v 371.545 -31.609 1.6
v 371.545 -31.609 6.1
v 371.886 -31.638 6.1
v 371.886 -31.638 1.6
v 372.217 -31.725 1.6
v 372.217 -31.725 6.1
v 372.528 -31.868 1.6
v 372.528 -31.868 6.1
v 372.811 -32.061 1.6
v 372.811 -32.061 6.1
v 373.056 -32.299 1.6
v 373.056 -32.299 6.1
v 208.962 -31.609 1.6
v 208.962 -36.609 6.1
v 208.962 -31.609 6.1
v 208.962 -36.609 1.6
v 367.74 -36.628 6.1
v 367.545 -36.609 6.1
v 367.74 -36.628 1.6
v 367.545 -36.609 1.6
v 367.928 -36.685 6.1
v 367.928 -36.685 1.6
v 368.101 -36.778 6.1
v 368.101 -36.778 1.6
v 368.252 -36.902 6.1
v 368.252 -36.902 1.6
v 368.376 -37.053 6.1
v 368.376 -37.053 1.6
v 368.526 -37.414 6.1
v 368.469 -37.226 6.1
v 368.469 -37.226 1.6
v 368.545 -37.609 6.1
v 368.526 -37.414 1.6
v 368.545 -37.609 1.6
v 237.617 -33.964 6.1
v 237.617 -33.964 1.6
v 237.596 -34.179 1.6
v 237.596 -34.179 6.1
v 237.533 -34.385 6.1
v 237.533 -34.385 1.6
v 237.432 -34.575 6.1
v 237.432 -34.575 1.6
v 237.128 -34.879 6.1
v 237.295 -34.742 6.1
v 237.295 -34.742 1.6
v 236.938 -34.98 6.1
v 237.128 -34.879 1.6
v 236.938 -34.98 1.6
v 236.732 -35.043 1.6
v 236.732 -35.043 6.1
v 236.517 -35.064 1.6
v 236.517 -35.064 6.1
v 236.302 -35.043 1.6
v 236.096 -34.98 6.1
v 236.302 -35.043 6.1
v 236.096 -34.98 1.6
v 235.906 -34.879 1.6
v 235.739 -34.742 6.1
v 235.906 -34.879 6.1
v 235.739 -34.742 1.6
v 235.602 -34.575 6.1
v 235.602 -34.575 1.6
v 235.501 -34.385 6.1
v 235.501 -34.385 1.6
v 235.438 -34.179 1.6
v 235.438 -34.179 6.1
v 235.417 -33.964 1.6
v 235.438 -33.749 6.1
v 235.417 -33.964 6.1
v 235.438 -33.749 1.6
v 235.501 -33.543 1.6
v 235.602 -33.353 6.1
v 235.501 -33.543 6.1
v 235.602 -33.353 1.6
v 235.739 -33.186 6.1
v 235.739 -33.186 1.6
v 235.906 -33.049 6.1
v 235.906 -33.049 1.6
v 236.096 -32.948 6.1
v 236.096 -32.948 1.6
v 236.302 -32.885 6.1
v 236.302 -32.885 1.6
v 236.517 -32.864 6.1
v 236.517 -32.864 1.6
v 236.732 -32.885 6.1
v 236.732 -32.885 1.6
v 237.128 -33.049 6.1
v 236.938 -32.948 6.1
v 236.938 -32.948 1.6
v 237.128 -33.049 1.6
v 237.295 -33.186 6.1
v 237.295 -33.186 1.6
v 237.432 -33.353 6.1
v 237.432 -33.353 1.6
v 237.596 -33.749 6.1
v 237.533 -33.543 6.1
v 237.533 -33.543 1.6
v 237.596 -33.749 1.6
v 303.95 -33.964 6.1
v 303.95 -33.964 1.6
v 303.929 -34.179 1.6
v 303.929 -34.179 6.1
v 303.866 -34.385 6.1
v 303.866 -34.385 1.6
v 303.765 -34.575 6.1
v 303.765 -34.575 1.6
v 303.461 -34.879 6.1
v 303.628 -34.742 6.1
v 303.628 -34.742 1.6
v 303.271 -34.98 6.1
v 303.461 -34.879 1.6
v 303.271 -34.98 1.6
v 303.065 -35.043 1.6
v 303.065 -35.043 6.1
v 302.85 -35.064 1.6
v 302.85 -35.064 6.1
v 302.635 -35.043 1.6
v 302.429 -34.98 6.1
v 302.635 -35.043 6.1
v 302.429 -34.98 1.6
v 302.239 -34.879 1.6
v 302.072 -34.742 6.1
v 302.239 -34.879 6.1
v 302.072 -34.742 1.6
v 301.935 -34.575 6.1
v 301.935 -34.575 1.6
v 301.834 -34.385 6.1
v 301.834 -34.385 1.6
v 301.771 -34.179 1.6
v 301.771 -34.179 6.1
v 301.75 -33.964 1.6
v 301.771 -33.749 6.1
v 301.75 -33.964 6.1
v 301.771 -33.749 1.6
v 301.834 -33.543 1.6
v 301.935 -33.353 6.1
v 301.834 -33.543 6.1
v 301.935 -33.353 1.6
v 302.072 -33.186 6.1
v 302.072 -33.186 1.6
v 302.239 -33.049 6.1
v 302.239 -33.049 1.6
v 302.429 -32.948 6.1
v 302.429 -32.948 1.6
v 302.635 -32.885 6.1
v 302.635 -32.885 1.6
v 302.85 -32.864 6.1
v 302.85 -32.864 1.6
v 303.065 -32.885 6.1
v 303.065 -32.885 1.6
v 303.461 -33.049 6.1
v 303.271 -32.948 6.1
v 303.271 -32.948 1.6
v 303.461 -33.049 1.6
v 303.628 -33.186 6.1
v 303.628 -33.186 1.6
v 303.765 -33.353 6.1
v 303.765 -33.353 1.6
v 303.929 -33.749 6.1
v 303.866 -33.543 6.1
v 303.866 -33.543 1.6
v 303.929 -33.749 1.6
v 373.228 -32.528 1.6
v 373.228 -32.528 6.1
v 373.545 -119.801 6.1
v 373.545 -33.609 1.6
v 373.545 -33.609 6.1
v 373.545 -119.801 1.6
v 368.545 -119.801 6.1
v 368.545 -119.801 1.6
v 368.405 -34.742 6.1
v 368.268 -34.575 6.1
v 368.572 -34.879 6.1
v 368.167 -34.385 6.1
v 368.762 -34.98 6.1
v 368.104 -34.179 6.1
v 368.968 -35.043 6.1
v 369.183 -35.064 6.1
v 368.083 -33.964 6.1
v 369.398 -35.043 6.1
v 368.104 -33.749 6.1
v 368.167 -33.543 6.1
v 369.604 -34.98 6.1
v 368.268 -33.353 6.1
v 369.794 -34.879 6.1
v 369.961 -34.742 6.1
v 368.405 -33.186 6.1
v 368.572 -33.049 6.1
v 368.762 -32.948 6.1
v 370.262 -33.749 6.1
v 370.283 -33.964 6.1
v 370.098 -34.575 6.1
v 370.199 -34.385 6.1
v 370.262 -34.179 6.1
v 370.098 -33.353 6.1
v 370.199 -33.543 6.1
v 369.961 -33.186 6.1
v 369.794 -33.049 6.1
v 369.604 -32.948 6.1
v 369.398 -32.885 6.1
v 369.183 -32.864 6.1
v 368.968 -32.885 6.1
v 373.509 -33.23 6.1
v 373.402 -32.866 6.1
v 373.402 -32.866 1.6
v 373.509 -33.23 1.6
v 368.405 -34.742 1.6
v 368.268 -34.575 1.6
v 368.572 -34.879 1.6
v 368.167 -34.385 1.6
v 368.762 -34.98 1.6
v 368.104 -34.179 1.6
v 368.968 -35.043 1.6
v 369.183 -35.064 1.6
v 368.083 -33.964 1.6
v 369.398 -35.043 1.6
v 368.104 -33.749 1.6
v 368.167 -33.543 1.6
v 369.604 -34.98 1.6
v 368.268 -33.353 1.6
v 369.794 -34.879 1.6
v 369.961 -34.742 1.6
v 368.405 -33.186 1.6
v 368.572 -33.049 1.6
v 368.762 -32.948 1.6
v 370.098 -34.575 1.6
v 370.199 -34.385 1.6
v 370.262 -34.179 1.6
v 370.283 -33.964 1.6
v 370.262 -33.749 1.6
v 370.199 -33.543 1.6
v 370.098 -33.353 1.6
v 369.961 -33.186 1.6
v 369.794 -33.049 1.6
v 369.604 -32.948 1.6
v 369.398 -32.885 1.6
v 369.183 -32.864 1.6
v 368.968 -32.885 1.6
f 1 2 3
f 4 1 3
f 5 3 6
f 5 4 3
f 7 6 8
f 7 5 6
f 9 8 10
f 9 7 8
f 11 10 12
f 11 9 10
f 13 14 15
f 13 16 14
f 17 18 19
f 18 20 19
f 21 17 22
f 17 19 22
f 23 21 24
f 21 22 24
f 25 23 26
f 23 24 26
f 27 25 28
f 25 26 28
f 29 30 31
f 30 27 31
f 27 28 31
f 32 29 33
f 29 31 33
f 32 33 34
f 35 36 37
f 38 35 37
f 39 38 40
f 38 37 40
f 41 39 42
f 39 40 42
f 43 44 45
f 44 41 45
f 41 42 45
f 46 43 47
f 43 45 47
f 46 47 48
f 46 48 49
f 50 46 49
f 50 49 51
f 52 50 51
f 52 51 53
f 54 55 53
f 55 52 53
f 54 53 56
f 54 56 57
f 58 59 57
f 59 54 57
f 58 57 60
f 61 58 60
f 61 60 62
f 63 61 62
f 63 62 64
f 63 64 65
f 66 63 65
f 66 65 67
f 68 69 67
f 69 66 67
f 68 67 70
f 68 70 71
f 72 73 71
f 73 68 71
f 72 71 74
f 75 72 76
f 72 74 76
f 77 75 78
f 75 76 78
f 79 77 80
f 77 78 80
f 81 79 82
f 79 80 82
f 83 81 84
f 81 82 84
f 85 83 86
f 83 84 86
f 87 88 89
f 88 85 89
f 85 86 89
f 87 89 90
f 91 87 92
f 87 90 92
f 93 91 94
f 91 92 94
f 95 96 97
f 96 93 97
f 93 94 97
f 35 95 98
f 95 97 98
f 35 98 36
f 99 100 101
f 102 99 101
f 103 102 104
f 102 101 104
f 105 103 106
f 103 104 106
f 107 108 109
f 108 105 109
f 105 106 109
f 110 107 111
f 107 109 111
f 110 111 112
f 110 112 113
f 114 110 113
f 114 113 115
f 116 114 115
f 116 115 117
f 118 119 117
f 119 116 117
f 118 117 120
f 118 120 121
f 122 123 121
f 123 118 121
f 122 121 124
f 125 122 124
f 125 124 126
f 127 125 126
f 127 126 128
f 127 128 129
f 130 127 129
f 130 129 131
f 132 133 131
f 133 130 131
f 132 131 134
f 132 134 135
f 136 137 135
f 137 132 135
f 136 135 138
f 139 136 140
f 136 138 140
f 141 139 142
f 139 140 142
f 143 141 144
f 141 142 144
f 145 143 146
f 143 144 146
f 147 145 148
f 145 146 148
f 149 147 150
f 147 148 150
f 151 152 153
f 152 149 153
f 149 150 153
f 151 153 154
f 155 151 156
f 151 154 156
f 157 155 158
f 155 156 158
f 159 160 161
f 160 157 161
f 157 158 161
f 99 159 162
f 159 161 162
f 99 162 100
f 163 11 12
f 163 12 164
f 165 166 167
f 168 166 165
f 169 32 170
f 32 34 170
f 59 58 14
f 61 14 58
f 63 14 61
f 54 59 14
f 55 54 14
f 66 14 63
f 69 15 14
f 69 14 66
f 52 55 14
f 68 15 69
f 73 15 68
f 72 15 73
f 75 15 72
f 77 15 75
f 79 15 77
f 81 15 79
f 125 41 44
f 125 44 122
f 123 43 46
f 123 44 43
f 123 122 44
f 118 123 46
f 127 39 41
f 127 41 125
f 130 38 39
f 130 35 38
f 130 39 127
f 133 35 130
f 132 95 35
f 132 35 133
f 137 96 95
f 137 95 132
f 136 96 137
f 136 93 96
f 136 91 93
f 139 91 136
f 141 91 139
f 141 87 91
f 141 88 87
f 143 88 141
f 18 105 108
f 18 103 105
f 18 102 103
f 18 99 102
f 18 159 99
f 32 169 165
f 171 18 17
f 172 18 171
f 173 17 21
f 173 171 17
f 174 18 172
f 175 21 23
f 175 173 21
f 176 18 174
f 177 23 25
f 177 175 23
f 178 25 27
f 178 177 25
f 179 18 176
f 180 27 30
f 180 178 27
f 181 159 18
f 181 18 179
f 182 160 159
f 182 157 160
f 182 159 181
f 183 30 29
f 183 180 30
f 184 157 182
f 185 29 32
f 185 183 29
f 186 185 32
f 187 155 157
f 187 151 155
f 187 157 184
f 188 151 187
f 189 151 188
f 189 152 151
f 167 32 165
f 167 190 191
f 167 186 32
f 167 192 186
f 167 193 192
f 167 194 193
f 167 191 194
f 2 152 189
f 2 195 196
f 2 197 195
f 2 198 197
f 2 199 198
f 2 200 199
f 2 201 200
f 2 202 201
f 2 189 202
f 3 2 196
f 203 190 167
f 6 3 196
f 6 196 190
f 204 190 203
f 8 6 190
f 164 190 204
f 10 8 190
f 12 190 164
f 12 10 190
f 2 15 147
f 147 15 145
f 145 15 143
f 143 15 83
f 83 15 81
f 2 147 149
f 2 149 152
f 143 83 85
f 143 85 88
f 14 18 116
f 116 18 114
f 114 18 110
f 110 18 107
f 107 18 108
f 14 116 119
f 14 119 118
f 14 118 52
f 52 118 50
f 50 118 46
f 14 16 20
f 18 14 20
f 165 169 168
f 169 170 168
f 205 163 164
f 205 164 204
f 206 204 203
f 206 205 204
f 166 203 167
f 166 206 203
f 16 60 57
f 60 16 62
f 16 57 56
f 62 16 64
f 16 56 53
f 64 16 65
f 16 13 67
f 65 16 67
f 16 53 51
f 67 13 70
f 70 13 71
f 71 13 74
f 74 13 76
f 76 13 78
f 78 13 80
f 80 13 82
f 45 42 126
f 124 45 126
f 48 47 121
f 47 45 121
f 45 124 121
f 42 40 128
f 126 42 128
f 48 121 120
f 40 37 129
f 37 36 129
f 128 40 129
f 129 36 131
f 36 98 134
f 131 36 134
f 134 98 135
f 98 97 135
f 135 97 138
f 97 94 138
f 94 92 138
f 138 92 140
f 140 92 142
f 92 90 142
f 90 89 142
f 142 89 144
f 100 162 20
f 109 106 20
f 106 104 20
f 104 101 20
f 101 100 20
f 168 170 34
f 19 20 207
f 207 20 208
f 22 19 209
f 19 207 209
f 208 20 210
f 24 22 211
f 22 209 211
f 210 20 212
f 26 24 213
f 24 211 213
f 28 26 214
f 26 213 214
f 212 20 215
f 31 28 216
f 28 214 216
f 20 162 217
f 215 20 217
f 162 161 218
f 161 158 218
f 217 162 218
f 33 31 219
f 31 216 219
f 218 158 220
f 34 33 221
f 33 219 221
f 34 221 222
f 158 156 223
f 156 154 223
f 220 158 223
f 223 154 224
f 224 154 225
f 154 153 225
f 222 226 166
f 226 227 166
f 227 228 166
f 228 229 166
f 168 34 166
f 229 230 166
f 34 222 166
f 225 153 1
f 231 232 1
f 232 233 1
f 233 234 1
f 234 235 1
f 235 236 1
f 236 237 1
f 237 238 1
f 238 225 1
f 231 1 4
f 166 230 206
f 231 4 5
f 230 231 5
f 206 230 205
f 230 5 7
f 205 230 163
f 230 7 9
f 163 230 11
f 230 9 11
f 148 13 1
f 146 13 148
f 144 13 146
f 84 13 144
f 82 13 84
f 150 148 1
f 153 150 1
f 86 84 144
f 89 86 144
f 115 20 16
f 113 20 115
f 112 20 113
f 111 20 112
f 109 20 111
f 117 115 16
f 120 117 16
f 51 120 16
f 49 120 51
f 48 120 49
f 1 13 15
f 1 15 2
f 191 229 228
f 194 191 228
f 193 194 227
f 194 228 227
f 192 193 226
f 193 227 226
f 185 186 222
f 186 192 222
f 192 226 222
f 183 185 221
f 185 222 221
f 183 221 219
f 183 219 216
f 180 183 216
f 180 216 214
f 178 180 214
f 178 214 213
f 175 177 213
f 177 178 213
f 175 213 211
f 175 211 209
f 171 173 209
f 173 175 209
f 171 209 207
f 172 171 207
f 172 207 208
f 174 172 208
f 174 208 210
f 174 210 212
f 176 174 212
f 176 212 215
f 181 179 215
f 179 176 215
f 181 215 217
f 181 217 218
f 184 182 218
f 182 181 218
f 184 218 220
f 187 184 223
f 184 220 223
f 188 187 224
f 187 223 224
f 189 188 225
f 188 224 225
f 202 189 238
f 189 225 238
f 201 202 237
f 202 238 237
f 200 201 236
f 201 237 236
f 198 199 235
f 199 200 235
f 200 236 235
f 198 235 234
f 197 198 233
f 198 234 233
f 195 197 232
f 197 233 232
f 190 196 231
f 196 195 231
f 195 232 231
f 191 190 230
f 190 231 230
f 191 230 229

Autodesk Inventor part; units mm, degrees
ref_plane "YZ Plane" through (0, 0, 0) normal (1, 0, 0) x (0, 1, 0)
ref_plane "XZ Plane" through (0, 0, 0) normal (0, 1, 0) x (-1, 0, 0)
ref_plane "XY Plane" through (0, 0, 0) normal (0, 0, 1) x (1, 0, 0)
ref_plane "Work Plane2" through (35.545, -31.609, 1.6) normal (0, 0, 1) x (1, 0, 0)
ref_plane "Work Plane1" through (35.545, -31.609, 1.6) normal (0, 0, 1) x (1, 0, 0)
sketch "Sketch1" plane through (35.545, -31.609, 1.6) normal (0, 0, 1) x (1, 0, 0)
  line L0 (0, 0) -> (336, 0) projected
  line L1 (-2, -129) -> (-2, -2) projected
  line L2 (-1.6825, -0.9187) -> (-1.5115, -0.6903) projected
  arc A0 (0, 0) -> (-2, -2) centre (0, -2) ccw
  line L3 (338, -2) -> (338, -129) projected
  line L4 (337.5115, -0.6903) -> (337.6825, -0.9187) projected
  arc A1 (338, -2) -> (336, 0) centre (336, -2) ccw
  line L5 (336, -131) -> (0, -131) projected
  line L6 (337.6825, -130.0813) -> (337.5115, -130.3097) projected
  arc A2 (336, -131) -> (338, -129) centre (336, -129) ccw
  arc A3 (-2, -129) -> (0, -131) centre (0, -129) ccw
  circle A4 centre (1.98, -128.63) radius 1.1 projected
  circle A5 centre (1.98, -128.63) radius 1.1
  circle A6 centre (68.313, -128.63) radius 1.1 projected
  circle A7 centre (134.646, -128.63) radius 1.1 projected
  circle A8 centre (134.646, -128.63) radius 1.1
  circle A9 centre (68.313, -128.63) radius 1.1
  circle A10 centre (200.979, -128.63) radius 1.1 projected
  circle A11 centre (267.312, -128.63) radius 1.1 projected
  circle A12 centre (333.645, -128.63) radius 1.1 projected
  circle A13 centre (333.645, -128.63) radius 1.1
  circle A14 centre (267.312, -128.63) radius 1.1
  circle A15 centre (200.979, -128.63) radius 1.1
  circle A16 centre (333.638, -2.355) radius 1.1 projected
  circle A17 centre (1.973, -2.355) radius 1.1 projected
  circle A18 centre (68.306, -2.355) radius 1.1 projected
  circle A19 centre (134.639, -2.355) radius 1.1 projected
  circle A20 centre (200.972, -2.355) radius 1.1 projected
  circle A21 centre (267.305, -2.355) radius 1.1 projected
  circle A22 centre (333.645, -2.355) radius 1.093
  circle A23 centre (267.305, -2.355) radius 1.1
  circle A24 centre (200.972, -2.355) radius 1.1
  circle A25 centre (134.639, -2.355) radius 1.1
  circle A26 centre (68.306, -2.355) radius 1.1
  circle A27 centre (1.973, -2.355) radius 1.1
  line L7 (3, -4.2357) -> (125.2758, -4.2357) construction
  line L8 (4, -5) -> (332, -5)
  line L9 (333, -6) -> (333, -125)
  line L10 (332, -126) -> (4, -126)
  line L11 (3, -125) -> (3, -6)
  arc A28 (4, -5) -> (3, -6) centre (4, -6) ccw
  arc A29 (333, -6) -> (332, -5) centre (332, -6) ccw
  arc A30 (332, -126) -> (333, -125) centre (332, -125) ccw
  arc A31 (3, -125) -> (4, -126) centre (4, -125) ccw
  line L12 (162.5077, 0) -> (162.5077, -5)
  line L13 (173.4174, -5) -> (173.4174, 0)
  circle A32 centre (320.737, -95.692) radius 0.175 projected
  line L14 (333, -88.192) -> (338, -88.192)
  line L15 (333, -102.192) -> (338, -102.192)
  line L16 (257.6125, -126) -> (315.0362, -126)
  line L17 (315.0362, -126) -> (315.0362, -126.7604)
  line L18 (315.0362, -126.7604) -> (257.6125, -126.7604)
  line L19 (257.6125, -126.7604) -> (257.6125, -126)
  point P0 (-35.545, 31.609)
  point P1 (-1.5115, -130.3097)
  point P2 (335.5, -88.192)
  point P3 (0, -131)
  point P4 (337.6825, -130.0813)
  point P5 (-1.6825, -0.9187)
  point P6 (337.6825, -0.9187)
  dimension "d2" = 5
  dimension "d3" = 5
  dimension "d4" = 5
  dimension "d5" = 5
  dimension "d6" = 1
  dimension "d7" = 1
  dimension "d8" = 1
  dimension "d9" = 1
extrude "Extrusion3" add sketch "Sketch1" along normal blind 4.5 contours L0 A1 L4 L3 L14 L9 A29 L8 L13
properties part number "open_liner_S"
